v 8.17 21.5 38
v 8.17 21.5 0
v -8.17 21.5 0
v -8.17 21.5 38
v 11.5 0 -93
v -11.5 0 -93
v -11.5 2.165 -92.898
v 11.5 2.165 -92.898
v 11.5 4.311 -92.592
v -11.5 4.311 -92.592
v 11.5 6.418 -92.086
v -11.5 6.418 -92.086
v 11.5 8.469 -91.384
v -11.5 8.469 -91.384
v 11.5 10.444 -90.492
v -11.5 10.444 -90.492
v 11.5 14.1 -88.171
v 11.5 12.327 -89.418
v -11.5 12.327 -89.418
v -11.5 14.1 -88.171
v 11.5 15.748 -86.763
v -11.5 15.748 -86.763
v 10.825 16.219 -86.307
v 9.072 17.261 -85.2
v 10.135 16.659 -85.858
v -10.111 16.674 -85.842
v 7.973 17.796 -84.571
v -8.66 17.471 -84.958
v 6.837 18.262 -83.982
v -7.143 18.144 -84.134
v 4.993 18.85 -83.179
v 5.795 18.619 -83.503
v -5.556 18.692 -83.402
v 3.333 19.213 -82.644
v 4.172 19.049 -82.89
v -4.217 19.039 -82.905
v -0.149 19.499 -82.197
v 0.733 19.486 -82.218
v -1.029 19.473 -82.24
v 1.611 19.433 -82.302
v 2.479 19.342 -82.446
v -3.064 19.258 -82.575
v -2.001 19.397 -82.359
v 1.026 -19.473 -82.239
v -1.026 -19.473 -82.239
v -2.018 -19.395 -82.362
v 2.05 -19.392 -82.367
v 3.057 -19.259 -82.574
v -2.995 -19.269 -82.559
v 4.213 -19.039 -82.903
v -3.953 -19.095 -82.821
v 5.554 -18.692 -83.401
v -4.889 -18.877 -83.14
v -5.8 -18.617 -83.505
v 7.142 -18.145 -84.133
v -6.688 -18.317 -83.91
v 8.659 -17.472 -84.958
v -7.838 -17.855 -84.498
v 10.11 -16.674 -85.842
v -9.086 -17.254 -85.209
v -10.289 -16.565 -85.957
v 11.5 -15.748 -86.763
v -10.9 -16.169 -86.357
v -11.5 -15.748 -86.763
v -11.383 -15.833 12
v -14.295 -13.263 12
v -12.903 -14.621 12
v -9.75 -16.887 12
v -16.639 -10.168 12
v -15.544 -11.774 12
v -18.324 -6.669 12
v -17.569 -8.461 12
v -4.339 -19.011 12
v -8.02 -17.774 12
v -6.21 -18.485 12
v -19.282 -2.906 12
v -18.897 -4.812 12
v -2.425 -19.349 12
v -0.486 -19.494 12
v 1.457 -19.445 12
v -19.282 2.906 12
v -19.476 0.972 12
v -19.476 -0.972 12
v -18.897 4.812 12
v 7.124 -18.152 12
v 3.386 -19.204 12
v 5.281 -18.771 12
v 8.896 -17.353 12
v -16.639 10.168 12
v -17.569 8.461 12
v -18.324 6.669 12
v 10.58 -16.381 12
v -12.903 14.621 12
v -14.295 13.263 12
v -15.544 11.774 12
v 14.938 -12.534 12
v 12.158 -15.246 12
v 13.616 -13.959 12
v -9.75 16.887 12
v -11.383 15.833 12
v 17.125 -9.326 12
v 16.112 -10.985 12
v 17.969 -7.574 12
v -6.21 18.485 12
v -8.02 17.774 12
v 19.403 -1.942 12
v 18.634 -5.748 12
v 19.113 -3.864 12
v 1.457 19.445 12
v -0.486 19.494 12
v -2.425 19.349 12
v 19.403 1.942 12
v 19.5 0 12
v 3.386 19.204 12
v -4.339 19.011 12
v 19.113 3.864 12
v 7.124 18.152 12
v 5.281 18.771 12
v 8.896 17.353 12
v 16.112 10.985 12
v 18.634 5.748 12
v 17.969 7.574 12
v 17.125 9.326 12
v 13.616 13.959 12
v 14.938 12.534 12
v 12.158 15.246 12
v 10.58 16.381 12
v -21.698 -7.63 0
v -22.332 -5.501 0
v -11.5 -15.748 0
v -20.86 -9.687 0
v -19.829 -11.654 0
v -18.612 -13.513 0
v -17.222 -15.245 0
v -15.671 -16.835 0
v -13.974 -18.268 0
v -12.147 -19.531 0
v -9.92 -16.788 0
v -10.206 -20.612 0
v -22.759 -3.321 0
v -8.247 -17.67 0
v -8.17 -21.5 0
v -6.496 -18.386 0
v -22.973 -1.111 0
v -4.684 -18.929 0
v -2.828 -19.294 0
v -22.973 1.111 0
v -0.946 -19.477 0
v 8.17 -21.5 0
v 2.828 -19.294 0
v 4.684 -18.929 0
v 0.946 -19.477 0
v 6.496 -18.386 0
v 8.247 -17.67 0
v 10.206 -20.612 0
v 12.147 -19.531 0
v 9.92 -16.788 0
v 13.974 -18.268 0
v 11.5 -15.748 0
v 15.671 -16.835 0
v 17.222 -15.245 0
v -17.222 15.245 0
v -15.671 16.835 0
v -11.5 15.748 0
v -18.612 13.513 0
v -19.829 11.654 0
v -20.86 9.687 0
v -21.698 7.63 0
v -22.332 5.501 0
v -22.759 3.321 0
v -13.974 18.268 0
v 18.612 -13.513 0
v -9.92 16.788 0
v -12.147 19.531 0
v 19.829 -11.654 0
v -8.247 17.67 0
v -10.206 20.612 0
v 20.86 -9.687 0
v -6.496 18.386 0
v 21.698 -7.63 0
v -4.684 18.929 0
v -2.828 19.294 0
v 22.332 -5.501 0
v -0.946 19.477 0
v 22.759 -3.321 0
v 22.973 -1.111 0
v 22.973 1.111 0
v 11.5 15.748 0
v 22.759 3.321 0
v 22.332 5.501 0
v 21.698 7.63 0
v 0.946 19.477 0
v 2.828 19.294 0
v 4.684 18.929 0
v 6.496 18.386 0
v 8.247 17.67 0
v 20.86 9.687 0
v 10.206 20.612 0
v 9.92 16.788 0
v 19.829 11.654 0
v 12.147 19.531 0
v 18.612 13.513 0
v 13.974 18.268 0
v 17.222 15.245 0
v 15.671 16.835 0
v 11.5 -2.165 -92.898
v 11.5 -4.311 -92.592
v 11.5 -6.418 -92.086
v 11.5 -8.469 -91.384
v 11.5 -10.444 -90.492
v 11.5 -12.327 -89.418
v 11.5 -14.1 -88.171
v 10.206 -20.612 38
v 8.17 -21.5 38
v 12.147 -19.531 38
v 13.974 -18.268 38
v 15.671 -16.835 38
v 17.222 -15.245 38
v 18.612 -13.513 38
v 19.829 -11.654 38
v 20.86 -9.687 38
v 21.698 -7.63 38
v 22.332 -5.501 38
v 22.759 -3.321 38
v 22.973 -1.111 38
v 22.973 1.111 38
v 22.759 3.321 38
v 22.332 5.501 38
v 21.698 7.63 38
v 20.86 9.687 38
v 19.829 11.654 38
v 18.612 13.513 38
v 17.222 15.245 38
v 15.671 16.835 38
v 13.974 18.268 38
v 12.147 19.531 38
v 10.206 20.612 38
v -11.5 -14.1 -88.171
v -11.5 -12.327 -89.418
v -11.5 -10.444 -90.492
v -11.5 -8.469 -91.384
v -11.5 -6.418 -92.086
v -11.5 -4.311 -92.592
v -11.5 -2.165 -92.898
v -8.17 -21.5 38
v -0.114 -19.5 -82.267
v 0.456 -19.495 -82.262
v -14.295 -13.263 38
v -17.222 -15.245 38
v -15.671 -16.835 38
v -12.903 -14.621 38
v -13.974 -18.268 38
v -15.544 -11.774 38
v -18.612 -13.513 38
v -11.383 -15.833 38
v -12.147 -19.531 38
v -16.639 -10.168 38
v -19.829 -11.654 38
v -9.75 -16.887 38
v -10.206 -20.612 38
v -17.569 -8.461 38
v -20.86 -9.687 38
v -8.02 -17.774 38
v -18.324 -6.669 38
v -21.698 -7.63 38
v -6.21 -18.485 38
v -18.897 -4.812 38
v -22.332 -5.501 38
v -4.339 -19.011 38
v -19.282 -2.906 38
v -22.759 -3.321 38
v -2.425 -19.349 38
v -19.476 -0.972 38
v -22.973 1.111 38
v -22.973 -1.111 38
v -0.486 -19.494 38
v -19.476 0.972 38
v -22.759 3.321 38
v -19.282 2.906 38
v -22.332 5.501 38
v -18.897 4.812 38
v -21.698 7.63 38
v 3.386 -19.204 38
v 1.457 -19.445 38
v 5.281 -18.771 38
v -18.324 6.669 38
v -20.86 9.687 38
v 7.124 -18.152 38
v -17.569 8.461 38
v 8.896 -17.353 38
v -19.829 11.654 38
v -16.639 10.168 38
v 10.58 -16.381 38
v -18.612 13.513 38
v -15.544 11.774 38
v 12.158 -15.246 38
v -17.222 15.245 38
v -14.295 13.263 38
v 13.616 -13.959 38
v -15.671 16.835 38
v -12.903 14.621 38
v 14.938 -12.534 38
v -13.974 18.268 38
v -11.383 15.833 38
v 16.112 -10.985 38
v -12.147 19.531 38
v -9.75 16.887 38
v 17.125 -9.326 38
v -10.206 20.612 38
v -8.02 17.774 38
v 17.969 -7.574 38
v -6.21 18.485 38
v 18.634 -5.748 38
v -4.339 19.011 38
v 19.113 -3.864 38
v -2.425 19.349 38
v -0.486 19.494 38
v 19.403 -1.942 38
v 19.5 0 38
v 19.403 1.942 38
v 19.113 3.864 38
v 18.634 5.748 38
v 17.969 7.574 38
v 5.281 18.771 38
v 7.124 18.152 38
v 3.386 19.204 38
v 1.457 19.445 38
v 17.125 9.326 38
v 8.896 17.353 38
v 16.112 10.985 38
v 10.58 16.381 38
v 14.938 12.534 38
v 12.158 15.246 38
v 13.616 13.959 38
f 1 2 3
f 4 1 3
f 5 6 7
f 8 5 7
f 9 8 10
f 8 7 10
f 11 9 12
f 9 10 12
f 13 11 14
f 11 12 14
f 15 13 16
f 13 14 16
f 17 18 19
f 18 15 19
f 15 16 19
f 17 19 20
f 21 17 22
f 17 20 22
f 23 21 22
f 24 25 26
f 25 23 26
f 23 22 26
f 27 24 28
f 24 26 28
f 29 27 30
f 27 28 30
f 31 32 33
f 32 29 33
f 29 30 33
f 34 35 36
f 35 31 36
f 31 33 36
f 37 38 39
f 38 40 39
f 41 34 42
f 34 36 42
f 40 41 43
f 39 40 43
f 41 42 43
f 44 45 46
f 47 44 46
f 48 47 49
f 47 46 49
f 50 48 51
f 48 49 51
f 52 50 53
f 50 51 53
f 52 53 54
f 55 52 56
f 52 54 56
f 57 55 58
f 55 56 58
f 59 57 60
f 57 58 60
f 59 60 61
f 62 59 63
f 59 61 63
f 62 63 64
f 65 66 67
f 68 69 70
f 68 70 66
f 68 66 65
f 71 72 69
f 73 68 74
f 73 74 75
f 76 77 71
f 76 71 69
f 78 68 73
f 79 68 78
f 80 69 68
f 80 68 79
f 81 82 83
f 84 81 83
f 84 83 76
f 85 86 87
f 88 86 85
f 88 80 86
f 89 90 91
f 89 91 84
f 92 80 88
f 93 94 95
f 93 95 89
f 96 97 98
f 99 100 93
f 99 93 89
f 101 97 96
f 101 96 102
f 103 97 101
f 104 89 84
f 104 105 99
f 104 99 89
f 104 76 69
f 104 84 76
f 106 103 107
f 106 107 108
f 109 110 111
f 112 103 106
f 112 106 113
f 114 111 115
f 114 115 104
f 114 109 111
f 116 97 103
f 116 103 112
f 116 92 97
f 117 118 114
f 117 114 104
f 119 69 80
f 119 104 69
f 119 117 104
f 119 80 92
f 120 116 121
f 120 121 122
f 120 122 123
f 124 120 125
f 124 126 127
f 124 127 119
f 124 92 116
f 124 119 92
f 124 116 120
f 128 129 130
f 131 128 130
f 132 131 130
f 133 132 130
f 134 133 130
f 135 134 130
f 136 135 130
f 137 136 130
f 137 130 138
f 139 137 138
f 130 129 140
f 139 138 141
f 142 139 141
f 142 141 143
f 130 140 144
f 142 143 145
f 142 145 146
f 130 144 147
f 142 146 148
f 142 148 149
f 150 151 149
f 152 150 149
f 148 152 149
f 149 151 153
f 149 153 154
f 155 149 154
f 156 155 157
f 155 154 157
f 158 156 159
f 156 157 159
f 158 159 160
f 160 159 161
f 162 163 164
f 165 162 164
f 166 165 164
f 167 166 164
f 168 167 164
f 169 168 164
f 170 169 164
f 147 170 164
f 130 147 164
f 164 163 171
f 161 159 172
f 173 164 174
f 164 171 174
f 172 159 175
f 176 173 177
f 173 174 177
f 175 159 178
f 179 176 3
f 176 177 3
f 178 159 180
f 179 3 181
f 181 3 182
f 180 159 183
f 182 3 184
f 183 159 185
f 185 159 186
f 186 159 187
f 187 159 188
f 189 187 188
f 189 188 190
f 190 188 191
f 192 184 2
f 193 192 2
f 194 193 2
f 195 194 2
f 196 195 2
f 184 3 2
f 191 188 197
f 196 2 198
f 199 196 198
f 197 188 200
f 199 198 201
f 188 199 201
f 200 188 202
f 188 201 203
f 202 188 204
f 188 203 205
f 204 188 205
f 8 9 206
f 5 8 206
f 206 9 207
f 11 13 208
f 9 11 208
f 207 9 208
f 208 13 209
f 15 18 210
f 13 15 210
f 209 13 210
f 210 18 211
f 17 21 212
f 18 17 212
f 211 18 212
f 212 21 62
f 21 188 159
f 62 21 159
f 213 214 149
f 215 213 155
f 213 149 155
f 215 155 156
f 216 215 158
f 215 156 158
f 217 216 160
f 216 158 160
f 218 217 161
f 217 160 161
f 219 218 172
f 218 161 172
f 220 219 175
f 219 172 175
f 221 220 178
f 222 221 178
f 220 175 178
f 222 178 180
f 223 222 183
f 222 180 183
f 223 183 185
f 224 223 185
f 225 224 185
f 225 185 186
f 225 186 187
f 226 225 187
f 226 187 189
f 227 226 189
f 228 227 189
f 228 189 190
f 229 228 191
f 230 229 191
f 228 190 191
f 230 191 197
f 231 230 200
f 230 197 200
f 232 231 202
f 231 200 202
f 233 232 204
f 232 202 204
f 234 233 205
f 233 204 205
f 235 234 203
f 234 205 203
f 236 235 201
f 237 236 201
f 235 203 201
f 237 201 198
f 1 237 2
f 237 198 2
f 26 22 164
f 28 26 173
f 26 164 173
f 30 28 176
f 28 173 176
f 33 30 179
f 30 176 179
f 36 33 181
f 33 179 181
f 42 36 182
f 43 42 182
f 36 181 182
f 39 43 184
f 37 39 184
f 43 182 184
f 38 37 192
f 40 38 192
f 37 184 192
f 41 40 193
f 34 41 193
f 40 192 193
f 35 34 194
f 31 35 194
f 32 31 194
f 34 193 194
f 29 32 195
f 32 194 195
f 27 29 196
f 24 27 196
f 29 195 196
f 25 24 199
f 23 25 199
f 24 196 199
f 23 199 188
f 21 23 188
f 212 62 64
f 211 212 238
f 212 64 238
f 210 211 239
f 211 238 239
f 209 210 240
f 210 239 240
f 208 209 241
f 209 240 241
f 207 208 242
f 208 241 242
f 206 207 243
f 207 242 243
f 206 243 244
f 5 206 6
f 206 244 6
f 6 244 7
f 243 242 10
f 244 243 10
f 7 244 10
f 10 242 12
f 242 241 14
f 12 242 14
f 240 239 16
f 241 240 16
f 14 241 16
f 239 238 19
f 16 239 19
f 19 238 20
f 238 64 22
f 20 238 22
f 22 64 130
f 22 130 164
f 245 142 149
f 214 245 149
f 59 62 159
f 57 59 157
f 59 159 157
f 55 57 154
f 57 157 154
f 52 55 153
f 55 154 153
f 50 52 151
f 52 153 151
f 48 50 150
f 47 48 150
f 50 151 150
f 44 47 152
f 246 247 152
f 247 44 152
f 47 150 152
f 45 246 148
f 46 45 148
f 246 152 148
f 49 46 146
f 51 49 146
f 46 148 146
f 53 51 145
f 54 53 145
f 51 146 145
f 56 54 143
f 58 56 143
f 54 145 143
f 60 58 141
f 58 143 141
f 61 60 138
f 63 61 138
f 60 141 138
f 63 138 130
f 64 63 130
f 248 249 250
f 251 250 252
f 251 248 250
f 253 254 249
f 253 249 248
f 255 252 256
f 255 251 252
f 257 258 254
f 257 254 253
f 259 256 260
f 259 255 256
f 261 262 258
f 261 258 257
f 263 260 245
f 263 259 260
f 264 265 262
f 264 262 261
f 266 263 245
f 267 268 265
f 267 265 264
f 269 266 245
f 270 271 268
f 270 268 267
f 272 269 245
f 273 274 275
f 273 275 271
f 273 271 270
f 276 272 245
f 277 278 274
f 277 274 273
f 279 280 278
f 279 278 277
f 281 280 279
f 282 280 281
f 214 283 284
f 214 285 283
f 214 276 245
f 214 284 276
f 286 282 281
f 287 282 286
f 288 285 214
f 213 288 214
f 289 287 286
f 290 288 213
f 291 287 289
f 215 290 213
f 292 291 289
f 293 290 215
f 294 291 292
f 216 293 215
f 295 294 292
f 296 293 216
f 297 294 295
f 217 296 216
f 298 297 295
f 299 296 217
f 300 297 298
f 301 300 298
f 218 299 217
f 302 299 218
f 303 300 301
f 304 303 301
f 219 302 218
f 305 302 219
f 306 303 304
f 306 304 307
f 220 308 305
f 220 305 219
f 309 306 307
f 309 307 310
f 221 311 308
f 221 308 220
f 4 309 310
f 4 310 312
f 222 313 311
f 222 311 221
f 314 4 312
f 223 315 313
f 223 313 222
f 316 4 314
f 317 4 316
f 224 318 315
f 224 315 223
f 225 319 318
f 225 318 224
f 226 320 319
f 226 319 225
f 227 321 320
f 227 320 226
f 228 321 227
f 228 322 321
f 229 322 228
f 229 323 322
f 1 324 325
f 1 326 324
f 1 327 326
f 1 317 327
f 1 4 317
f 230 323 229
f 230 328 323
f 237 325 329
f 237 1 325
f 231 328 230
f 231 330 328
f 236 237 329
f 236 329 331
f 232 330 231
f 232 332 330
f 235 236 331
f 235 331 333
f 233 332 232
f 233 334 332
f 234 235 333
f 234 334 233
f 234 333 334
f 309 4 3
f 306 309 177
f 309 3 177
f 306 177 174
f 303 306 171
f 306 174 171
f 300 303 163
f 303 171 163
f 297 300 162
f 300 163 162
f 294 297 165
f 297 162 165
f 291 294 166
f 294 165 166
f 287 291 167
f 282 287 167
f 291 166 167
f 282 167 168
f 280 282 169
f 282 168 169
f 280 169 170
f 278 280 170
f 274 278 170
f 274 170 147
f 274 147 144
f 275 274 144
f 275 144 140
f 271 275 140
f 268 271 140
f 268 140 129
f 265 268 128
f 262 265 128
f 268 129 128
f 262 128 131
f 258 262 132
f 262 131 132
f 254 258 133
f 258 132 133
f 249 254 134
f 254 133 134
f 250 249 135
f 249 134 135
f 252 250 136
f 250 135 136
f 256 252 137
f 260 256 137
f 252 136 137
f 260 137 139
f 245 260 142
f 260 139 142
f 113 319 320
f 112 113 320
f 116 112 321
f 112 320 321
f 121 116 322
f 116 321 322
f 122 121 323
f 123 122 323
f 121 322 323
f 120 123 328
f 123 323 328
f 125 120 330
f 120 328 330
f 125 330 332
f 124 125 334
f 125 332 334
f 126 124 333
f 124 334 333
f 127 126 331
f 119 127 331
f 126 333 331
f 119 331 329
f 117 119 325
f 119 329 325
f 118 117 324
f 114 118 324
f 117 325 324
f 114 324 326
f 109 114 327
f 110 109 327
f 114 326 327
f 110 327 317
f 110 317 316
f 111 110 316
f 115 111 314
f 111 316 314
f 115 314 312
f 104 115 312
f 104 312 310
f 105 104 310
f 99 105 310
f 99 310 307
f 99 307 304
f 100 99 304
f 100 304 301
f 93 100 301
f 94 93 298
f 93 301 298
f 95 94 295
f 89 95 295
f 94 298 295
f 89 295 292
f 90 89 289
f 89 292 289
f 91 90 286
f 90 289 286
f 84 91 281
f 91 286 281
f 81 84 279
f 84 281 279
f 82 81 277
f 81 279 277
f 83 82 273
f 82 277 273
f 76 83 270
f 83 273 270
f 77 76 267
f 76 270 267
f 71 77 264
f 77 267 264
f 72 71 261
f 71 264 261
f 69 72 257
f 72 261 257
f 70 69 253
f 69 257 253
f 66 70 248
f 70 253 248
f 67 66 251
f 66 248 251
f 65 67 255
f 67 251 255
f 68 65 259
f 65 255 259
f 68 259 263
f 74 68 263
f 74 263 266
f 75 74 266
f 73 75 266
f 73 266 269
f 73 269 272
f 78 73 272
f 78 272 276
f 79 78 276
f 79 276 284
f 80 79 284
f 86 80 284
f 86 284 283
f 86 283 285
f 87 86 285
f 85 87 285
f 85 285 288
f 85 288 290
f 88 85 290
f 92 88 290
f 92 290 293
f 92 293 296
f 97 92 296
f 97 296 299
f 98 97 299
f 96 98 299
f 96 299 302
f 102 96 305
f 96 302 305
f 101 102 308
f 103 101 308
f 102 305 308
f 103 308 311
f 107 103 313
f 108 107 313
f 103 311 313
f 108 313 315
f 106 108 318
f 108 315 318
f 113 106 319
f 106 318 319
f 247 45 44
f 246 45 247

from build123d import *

# Parameters (mm, degrees)
F1_DEPTH = 38
F2_R     = 19.5
F3_DEPTH = 26
F5_DEPTH = 93
F7_DEPTH = 34.501


with BuildPart() as f1:
    # F0 (on Top) → F1 (new body)
    with BuildSketch(Plane.XY):
        with BuildLine():
            Line((8.170067, 21.5), (-8.170067, 21.5))
            ThreePointArc((-8.170067, 21.5), (-23, 0), (-8.170067, -21.5))
            Line((-8.170067, -21.5), (8.170067, -21.5))
            ThreePointArc((8.170067, -21.5), (23, 0), (8.170067, 21.5))
        make_face()
    extrude(amount=F1_DEPTH)

    # F2 (on face) → F3 (cut)
    with BuildSketch(Plane.XY.offset(38)):
        Circle(F2_R)
    extrude(amount=-F3_DEPTH, mode=Mode.SUBTRACT)

    # F4 (on face) → F5 (join)
    with BuildSketch(Plane(origin=(0, 0, 0), x_dir=(1, 0, 0), z_dir=(0, 0, -1))):
        with BuildLine():
            Line((-11.5, 15.748016), (-11.5, -15.748016))
            ThreePointArc((-11.5, -15.748016), (0, -19.5), (11.5, -15.748016))
            Line((11.5, -15.748016), (11.5, 15.748016))
            ThreePointArc((11.5, 15.748016), (0, 19.5), (-11.5, 15.748016))
        make_face()
    extrude(amount=F5_DEPTH)

    # F6 (on face) → F7 (cut, through all)
    with BuildSketch(Plane(origin=(-11.5, 0, 0), x_dir=(0, -1, 0), z_dir=(-1, 0, 0))):
        with BuildLine():
            Line((38.116675, -101.656117), (19.472977, -82.23941))
            ThreePointArc((19.472977, -82.23941), (17.755152, -84.620348), (15.748016, -86.763055))
            Line((15.748016, -86.763055), (15.748016, -93))
            Line((15.748016, -93), (0, -93))
            Line((0, -93), (-15.748016, -93))
            Line((-15.748016, -93), (-15.748016, -86.763055))
            ThreePointArc((-15.748016, -86.763055), (-17.850565, -84.503701), (-19.63169, -81.983187))
            Line((-19.63169, -81.983187), (-36.674619, -101.656117))
            Line((-36.674619, -101.656117), (38.116675, -101.656117))
        make_face()
        with BuildLine():
            Line((15.748016, -93), (15.748016, -86.763055))
            ThreePointArc((15.748016, -86.763055), (8.469054, -91.383992), (0, -93))
            Line((0, -93), (15.748016, -93))
        make_face()
        with BuildLine():
            Line((-15.748016, -93), (0, -93))
            ThreePointArc((0, -93), (-8.469054, -91.383992), (-15.748016, -86.763055))
            Line((-15.748016, -86.763055), (-15.748016, -93))
        make_face()
    extrude(amount=-F7_DEPTH, mode=Mode.SUBTRACT)


solid = f1.part
